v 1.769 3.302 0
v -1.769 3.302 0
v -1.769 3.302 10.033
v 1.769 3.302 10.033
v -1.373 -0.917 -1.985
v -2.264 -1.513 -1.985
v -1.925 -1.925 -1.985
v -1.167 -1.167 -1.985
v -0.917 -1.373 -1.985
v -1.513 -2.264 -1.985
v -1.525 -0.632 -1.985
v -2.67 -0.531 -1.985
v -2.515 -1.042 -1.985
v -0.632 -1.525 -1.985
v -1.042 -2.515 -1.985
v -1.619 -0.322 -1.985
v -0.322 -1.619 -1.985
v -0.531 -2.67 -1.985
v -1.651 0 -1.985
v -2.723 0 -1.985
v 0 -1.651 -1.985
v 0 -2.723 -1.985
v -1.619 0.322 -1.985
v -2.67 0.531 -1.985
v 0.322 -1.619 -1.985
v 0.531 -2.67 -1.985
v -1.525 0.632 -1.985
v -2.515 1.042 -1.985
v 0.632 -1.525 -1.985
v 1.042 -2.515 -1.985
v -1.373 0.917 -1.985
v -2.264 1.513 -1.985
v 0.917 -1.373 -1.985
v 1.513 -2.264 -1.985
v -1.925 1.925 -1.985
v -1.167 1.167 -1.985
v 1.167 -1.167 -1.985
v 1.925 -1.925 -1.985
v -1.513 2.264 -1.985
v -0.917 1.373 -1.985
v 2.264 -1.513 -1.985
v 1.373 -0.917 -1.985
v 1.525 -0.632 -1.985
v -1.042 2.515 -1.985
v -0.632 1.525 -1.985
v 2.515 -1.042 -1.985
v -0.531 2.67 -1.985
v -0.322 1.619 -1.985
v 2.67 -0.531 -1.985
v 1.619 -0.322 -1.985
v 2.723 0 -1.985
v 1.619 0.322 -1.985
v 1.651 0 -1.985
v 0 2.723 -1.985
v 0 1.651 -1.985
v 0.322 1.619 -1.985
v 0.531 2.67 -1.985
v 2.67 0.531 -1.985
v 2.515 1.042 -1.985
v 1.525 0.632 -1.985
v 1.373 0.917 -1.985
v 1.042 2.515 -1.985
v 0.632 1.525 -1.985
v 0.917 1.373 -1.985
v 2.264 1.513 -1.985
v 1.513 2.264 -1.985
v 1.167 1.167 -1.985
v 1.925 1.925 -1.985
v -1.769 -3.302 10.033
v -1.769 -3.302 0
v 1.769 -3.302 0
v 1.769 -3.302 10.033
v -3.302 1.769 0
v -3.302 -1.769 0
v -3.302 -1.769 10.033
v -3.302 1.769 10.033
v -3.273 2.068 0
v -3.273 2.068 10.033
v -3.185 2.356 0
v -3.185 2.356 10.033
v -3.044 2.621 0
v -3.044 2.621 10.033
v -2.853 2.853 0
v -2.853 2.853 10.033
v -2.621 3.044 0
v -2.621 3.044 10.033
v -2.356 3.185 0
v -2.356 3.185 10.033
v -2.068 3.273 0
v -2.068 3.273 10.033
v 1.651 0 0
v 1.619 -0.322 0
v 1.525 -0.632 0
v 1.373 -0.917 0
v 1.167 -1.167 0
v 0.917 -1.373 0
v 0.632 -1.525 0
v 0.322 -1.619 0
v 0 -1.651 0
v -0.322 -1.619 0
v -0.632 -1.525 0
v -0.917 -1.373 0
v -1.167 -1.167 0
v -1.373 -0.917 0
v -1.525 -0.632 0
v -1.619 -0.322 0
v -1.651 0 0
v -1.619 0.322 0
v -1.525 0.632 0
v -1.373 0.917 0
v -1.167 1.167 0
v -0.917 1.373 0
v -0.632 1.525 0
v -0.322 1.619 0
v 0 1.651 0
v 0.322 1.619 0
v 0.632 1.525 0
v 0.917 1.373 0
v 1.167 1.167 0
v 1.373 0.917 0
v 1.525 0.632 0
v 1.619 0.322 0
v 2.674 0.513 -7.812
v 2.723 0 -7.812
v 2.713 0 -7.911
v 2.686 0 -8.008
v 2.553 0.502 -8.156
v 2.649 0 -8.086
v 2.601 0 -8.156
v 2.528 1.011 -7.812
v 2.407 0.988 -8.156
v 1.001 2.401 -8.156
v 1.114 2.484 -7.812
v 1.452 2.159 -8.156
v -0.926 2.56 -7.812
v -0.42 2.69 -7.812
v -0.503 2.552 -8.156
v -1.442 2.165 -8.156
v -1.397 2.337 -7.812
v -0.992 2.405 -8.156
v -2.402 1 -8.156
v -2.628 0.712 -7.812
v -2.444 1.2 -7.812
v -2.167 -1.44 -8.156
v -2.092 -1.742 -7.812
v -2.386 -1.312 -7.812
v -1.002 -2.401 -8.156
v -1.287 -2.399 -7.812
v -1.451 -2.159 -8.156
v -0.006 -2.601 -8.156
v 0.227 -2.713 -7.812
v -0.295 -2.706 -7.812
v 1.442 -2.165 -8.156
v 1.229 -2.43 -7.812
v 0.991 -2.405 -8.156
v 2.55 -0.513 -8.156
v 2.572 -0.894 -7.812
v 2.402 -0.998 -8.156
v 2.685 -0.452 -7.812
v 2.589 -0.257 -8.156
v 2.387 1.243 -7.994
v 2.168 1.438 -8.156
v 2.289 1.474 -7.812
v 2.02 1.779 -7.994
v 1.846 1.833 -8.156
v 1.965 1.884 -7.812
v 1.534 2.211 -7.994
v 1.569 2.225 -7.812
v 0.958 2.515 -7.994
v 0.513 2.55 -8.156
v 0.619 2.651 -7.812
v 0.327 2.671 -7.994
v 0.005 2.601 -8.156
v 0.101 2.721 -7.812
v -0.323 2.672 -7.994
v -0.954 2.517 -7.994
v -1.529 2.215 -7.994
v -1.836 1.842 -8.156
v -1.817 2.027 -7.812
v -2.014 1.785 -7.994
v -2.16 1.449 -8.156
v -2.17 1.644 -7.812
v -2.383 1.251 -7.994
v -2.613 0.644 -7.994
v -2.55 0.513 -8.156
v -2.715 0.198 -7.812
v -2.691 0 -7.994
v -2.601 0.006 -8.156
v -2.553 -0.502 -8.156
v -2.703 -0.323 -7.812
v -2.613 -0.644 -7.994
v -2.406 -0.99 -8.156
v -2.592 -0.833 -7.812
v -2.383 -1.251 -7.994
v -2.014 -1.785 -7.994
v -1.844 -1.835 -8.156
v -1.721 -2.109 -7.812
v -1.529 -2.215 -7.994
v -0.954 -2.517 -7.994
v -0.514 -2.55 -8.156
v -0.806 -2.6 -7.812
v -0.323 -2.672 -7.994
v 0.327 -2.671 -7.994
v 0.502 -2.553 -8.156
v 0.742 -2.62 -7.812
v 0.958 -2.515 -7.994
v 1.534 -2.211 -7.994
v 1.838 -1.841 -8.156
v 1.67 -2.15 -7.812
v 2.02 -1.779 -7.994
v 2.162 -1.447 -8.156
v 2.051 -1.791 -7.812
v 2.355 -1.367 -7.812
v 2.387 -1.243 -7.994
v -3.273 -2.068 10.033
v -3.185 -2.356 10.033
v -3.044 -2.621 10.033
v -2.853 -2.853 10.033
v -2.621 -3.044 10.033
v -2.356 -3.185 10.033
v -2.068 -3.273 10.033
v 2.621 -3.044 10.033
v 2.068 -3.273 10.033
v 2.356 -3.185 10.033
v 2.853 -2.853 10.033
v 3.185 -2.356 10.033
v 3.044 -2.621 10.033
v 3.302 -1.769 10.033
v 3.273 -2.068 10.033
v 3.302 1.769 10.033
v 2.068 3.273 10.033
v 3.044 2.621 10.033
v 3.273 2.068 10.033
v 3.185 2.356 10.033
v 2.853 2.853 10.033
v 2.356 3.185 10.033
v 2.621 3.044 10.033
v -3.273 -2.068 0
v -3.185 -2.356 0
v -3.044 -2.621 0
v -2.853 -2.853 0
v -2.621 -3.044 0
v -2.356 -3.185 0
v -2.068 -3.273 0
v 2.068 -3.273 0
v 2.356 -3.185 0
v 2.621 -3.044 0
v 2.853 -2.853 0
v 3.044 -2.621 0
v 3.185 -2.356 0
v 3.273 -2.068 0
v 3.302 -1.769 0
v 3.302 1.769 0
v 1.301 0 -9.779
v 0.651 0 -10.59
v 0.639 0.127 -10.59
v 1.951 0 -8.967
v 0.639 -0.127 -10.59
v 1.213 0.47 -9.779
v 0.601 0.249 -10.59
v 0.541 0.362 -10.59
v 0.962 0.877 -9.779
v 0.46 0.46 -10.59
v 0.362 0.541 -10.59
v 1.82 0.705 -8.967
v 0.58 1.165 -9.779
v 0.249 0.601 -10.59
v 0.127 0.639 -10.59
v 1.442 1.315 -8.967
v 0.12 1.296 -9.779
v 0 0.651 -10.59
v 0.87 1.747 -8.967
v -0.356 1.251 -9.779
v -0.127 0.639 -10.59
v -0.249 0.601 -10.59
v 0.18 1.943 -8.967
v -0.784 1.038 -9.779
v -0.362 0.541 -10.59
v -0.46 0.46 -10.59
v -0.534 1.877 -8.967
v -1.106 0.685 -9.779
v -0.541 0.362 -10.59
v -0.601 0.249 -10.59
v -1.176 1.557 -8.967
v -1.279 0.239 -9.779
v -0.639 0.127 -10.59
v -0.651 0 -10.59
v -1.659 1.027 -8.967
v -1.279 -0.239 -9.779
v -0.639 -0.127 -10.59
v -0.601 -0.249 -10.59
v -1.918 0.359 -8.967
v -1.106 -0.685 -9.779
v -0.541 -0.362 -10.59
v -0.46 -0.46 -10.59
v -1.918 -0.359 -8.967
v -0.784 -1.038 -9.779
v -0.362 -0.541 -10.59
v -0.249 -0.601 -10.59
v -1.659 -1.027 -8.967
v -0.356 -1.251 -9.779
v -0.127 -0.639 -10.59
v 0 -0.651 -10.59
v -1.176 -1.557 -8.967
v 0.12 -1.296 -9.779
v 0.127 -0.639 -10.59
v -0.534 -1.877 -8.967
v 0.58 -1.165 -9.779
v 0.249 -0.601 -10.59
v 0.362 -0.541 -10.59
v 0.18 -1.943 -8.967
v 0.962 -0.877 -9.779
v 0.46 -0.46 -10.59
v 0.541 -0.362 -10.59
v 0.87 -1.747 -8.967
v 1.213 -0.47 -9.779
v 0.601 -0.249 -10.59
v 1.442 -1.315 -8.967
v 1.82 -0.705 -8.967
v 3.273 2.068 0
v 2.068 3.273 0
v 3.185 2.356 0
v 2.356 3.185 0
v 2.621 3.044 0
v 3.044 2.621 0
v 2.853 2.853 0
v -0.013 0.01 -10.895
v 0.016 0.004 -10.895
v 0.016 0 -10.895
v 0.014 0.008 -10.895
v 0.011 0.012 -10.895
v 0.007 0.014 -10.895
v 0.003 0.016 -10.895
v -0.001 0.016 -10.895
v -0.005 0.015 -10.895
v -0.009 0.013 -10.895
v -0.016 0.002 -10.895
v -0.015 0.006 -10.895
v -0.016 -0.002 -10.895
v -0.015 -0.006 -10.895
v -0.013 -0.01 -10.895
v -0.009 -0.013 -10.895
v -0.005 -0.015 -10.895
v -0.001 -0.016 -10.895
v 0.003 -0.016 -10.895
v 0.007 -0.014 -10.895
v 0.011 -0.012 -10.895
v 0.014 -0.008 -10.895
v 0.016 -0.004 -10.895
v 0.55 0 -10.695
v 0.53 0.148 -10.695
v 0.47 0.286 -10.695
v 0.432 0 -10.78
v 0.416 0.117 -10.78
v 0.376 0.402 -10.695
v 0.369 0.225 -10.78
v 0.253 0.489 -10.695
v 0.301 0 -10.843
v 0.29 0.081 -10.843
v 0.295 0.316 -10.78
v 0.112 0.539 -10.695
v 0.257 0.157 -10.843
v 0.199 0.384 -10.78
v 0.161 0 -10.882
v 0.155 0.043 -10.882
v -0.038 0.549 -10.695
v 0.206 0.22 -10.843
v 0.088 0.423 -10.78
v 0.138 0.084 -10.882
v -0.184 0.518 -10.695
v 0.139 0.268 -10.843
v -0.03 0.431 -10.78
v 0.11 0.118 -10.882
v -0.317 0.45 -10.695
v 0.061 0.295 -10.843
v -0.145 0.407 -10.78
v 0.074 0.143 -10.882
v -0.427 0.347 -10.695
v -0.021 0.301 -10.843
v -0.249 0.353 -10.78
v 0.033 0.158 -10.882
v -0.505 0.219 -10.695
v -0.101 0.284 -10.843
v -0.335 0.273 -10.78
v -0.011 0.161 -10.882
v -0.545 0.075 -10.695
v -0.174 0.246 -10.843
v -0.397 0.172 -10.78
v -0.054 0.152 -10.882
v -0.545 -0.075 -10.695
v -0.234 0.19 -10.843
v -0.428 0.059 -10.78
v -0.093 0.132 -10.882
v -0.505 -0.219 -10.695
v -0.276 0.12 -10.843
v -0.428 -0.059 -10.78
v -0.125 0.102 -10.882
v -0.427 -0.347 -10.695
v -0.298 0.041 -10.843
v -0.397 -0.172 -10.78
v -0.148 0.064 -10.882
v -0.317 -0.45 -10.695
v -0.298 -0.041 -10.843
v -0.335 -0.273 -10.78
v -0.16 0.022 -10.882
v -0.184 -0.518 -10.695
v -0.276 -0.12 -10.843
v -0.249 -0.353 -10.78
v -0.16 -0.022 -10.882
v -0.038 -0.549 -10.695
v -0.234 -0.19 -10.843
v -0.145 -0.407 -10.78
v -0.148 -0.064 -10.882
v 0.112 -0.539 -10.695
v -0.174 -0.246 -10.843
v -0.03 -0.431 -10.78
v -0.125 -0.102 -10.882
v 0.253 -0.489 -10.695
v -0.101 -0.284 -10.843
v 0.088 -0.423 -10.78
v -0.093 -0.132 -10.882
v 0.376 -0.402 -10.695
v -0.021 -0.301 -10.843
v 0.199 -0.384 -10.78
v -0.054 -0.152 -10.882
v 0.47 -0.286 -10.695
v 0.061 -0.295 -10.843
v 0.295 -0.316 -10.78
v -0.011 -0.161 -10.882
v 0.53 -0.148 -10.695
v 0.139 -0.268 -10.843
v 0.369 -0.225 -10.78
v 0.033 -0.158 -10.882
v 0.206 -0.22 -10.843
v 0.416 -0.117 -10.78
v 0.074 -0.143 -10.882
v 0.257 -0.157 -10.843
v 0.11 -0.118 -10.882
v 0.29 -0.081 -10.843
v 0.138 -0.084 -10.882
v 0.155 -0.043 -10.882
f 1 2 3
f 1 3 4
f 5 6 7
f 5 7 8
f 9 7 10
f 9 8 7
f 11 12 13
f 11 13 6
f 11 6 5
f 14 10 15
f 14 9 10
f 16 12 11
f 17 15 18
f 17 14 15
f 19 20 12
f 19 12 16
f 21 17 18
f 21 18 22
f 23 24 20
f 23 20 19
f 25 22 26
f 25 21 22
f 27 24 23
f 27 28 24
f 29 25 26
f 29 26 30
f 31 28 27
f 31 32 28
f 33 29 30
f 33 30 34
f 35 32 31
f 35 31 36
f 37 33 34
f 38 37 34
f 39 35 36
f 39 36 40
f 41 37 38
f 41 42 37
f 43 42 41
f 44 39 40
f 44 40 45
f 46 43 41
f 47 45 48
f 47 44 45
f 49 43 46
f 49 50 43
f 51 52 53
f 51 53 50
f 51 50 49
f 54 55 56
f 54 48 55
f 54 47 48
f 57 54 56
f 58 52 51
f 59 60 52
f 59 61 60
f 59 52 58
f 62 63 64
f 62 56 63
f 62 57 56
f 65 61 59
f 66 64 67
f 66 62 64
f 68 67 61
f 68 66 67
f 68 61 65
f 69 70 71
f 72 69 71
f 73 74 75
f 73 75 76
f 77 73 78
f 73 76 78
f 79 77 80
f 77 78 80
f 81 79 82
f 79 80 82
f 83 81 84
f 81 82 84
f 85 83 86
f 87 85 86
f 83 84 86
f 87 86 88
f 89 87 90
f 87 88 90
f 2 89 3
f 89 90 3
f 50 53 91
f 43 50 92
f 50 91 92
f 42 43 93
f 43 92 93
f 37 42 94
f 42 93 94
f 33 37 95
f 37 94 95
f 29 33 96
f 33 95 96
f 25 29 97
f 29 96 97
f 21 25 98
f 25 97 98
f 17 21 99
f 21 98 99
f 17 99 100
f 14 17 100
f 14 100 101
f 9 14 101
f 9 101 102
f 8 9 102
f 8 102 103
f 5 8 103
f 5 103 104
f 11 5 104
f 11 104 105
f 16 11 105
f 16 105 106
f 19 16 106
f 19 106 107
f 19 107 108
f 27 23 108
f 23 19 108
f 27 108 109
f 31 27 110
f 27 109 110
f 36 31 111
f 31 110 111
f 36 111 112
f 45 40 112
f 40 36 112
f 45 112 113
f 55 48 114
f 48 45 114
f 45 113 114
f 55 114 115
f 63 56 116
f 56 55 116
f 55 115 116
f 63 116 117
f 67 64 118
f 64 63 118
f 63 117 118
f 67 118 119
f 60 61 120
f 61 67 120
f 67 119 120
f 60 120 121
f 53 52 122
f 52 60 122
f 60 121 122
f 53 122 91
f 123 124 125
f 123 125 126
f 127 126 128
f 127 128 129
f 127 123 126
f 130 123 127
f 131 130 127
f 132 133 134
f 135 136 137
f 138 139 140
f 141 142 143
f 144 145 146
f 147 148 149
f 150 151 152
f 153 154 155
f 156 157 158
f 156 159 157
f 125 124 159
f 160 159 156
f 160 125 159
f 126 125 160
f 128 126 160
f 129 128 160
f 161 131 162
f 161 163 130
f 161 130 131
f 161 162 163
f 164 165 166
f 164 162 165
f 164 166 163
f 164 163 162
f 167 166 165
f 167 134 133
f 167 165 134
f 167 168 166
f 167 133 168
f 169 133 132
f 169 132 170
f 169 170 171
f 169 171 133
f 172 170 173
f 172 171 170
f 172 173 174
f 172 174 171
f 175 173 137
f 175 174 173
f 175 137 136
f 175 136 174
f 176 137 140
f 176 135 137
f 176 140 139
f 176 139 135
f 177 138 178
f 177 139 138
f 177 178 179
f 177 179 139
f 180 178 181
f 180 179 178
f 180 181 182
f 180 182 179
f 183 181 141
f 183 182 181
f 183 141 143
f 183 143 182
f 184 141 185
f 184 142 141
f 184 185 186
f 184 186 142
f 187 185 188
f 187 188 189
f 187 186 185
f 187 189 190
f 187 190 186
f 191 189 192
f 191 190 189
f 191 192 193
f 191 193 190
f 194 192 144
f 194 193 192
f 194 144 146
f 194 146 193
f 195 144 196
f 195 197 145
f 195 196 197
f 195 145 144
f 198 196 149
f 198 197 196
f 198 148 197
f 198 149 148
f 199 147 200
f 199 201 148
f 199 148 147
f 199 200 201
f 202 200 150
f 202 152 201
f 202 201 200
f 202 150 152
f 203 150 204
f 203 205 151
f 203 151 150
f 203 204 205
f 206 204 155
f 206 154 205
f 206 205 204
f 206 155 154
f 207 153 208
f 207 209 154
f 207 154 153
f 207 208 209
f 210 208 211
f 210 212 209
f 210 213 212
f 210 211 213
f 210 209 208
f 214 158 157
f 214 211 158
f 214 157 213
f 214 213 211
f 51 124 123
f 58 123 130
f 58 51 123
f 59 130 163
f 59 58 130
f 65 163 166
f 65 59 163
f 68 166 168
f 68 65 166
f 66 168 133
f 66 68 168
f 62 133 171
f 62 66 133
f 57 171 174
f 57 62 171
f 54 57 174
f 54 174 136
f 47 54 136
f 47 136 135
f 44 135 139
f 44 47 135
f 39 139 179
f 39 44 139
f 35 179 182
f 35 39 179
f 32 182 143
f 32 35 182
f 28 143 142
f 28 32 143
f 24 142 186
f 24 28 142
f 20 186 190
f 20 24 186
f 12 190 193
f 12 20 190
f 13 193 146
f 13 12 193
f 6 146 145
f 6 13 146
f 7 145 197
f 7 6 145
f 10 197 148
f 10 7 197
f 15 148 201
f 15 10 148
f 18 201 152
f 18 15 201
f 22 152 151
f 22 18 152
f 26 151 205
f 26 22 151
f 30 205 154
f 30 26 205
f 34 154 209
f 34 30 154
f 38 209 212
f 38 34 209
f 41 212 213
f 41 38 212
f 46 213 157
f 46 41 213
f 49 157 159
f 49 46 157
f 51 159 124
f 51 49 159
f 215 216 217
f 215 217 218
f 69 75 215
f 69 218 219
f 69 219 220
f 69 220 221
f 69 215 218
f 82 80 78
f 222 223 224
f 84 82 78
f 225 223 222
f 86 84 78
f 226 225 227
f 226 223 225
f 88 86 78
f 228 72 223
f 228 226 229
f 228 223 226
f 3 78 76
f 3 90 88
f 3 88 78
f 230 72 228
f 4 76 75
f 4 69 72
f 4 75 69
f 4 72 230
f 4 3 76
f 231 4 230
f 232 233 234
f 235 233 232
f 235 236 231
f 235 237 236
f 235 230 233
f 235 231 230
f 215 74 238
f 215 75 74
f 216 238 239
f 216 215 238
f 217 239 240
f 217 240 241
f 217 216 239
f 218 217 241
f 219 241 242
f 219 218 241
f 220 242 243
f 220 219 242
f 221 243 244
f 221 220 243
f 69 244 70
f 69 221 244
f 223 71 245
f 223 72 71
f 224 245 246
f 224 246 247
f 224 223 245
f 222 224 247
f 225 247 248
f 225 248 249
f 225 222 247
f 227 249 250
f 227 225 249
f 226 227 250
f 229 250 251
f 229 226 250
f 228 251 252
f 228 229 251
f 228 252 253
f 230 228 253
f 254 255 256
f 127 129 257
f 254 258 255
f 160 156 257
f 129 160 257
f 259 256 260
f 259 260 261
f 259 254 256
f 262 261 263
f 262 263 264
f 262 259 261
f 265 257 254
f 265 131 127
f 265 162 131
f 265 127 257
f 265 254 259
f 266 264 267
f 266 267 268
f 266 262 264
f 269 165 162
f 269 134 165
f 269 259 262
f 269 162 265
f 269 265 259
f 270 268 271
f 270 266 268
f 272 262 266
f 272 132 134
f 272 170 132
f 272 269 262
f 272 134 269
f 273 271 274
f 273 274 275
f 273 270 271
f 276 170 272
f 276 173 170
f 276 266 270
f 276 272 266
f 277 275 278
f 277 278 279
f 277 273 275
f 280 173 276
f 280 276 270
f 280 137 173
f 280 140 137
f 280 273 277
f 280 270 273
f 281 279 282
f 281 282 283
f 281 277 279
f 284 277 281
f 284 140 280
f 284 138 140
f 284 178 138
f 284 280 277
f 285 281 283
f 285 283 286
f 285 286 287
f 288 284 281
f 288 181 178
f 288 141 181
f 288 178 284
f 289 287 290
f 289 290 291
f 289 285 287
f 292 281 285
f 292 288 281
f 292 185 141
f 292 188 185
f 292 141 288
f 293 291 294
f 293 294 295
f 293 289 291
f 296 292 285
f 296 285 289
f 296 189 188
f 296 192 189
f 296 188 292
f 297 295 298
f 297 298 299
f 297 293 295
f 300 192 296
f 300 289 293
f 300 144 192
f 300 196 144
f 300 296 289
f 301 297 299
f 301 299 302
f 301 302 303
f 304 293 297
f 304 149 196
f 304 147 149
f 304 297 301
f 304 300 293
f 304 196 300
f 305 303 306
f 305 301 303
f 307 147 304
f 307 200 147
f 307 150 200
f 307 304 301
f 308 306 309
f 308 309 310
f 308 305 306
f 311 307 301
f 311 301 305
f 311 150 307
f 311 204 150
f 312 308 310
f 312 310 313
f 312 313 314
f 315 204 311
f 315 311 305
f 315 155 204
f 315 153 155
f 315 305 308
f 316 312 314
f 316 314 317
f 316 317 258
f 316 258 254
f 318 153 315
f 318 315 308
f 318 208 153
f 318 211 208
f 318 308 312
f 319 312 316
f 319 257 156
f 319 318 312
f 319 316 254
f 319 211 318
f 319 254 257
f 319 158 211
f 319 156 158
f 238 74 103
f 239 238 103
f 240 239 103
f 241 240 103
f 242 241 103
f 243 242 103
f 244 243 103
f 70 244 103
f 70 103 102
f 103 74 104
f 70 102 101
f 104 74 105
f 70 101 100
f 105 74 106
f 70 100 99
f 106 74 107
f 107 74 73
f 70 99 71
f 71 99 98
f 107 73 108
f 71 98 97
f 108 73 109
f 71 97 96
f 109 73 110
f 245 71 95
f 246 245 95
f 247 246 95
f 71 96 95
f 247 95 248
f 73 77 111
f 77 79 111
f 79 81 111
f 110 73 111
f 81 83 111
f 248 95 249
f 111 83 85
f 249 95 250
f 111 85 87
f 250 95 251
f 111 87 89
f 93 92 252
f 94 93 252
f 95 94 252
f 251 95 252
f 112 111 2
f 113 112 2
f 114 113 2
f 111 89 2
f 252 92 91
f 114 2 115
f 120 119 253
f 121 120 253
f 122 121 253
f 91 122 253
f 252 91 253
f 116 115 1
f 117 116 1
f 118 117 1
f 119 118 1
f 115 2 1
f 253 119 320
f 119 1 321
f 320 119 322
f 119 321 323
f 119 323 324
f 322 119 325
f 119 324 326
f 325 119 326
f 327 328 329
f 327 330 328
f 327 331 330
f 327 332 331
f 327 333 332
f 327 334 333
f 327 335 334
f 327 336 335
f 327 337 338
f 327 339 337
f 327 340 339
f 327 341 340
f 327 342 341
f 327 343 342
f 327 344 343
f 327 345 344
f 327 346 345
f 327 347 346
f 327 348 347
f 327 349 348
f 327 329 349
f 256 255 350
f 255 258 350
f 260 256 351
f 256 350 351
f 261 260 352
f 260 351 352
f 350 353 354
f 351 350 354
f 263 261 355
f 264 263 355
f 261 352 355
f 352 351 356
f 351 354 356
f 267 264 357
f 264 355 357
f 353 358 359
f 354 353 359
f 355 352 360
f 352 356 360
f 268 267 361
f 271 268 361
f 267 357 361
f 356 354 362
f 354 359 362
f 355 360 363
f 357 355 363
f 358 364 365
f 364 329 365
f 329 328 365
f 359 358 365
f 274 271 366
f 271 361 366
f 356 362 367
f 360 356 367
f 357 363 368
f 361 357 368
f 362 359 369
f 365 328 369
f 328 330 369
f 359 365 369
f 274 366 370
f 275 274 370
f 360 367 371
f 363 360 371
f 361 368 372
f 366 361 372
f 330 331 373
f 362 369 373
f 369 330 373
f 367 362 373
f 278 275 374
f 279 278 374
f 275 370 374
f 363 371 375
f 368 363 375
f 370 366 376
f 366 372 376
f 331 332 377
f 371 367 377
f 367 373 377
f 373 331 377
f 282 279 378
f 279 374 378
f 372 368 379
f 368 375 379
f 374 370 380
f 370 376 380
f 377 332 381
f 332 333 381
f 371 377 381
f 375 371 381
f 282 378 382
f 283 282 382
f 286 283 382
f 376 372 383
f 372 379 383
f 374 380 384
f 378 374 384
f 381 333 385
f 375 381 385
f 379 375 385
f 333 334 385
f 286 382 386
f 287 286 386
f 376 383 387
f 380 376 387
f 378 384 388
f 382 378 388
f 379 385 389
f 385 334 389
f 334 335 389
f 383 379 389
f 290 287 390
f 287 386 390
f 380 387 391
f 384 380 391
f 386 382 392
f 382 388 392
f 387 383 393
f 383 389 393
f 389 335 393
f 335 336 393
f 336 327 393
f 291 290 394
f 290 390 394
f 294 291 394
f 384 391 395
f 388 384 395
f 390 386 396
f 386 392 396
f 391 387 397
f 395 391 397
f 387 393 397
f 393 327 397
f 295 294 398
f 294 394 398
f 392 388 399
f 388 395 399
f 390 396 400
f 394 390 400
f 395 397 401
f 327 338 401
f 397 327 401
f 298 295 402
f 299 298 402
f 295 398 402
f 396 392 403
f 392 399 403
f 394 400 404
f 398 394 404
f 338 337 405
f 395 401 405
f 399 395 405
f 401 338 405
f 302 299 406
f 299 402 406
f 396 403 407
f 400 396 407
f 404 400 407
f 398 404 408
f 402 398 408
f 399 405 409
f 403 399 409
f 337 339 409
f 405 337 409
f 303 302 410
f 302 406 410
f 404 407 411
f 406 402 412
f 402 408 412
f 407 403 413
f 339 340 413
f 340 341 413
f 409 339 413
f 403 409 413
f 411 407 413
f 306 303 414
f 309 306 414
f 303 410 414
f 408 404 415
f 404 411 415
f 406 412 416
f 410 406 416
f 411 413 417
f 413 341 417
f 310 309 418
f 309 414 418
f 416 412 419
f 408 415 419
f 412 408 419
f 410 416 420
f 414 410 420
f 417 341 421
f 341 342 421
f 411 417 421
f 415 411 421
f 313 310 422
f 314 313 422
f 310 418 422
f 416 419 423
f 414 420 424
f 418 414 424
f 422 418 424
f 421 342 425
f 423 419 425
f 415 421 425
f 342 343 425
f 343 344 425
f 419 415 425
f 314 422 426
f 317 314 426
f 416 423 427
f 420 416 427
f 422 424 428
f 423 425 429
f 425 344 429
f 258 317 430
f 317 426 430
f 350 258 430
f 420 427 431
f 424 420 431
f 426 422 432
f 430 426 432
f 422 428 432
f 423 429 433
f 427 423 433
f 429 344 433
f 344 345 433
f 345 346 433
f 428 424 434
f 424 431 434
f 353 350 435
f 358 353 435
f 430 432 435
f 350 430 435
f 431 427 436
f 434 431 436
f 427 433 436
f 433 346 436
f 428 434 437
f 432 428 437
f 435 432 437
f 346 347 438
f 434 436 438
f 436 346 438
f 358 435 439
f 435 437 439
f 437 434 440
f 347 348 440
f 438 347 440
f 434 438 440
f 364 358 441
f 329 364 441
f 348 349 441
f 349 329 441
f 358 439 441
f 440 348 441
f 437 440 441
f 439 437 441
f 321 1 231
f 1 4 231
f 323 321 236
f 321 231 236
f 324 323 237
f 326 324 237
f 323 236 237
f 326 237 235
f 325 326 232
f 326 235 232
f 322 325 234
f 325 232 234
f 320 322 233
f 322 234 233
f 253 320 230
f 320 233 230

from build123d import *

# Parameters (mm, degrees)
F0_W     = 6.604
F0_H     = 6.604
F1_DEPTH = 10.033
F2_R     = 1.651
F3_DEPTH = 2.032
F7_R     = 0.8136293968
F8_R     = 1.5330256121
F9_R     = 0.551182731


with BuildPart() as f1:
    # F0 (on Top) → F1 (new body)
    with BuildSketch(Plane.XY):
        Rectangle(F0_W, F0_H)
    extrude(amount=F1_DEPTH)

    # F2 (on face) → F3 (join)
    with BuildSketch(Plane(origin=(0, 0, 0), x_dir=(1, 0, 0), z_dir=(0, 0, -1))):
        Circle(F2_R)
    extrude(amount=F3_DEPTH)

    # F5 (on mid) → F6 (revolve)
    with BuildSketch(Plane.XZ):
        Polygon((2.7225008234, -1.9854432903), (1.6116809566, -1.9854432903), (0, -1.9854432903), (0, -10.8945909888), (0.4067335685, -10.8945909888), (2.7225008234, -8.0052432903), align=None)
    revolve(axis=Axis((0, 0, -6.4400171395), (0, 0, 1)))

    # F7
    f7_edges = [f1.edges().sort_by_distance(p)[0] for p in [
        (-0.406734, 0, -10.894591),
    ]]
    fillet(f7_edges, radius=F7_R)

    # F8
    f8_edges = [f1.edges().sort_by_distance(p)[0] for p in [
        (-3.302, -3.302, 5.0165),
        (3.302, -3.302, 5.0165),
        (3.302, 3.302, 5.0165),
        (-3.302, 3.302, 5.0165),
    ]]
    fillet(f8_edges, radius=F8_R)

    # F9
    f9_edges = [f1.edges().sort_by_distance(p)[0] for p in [
        (-2.722501, 0, -8.005243),
    ]]
    fillet(f9_edges, radius=F9_R)


solid = f1.part
